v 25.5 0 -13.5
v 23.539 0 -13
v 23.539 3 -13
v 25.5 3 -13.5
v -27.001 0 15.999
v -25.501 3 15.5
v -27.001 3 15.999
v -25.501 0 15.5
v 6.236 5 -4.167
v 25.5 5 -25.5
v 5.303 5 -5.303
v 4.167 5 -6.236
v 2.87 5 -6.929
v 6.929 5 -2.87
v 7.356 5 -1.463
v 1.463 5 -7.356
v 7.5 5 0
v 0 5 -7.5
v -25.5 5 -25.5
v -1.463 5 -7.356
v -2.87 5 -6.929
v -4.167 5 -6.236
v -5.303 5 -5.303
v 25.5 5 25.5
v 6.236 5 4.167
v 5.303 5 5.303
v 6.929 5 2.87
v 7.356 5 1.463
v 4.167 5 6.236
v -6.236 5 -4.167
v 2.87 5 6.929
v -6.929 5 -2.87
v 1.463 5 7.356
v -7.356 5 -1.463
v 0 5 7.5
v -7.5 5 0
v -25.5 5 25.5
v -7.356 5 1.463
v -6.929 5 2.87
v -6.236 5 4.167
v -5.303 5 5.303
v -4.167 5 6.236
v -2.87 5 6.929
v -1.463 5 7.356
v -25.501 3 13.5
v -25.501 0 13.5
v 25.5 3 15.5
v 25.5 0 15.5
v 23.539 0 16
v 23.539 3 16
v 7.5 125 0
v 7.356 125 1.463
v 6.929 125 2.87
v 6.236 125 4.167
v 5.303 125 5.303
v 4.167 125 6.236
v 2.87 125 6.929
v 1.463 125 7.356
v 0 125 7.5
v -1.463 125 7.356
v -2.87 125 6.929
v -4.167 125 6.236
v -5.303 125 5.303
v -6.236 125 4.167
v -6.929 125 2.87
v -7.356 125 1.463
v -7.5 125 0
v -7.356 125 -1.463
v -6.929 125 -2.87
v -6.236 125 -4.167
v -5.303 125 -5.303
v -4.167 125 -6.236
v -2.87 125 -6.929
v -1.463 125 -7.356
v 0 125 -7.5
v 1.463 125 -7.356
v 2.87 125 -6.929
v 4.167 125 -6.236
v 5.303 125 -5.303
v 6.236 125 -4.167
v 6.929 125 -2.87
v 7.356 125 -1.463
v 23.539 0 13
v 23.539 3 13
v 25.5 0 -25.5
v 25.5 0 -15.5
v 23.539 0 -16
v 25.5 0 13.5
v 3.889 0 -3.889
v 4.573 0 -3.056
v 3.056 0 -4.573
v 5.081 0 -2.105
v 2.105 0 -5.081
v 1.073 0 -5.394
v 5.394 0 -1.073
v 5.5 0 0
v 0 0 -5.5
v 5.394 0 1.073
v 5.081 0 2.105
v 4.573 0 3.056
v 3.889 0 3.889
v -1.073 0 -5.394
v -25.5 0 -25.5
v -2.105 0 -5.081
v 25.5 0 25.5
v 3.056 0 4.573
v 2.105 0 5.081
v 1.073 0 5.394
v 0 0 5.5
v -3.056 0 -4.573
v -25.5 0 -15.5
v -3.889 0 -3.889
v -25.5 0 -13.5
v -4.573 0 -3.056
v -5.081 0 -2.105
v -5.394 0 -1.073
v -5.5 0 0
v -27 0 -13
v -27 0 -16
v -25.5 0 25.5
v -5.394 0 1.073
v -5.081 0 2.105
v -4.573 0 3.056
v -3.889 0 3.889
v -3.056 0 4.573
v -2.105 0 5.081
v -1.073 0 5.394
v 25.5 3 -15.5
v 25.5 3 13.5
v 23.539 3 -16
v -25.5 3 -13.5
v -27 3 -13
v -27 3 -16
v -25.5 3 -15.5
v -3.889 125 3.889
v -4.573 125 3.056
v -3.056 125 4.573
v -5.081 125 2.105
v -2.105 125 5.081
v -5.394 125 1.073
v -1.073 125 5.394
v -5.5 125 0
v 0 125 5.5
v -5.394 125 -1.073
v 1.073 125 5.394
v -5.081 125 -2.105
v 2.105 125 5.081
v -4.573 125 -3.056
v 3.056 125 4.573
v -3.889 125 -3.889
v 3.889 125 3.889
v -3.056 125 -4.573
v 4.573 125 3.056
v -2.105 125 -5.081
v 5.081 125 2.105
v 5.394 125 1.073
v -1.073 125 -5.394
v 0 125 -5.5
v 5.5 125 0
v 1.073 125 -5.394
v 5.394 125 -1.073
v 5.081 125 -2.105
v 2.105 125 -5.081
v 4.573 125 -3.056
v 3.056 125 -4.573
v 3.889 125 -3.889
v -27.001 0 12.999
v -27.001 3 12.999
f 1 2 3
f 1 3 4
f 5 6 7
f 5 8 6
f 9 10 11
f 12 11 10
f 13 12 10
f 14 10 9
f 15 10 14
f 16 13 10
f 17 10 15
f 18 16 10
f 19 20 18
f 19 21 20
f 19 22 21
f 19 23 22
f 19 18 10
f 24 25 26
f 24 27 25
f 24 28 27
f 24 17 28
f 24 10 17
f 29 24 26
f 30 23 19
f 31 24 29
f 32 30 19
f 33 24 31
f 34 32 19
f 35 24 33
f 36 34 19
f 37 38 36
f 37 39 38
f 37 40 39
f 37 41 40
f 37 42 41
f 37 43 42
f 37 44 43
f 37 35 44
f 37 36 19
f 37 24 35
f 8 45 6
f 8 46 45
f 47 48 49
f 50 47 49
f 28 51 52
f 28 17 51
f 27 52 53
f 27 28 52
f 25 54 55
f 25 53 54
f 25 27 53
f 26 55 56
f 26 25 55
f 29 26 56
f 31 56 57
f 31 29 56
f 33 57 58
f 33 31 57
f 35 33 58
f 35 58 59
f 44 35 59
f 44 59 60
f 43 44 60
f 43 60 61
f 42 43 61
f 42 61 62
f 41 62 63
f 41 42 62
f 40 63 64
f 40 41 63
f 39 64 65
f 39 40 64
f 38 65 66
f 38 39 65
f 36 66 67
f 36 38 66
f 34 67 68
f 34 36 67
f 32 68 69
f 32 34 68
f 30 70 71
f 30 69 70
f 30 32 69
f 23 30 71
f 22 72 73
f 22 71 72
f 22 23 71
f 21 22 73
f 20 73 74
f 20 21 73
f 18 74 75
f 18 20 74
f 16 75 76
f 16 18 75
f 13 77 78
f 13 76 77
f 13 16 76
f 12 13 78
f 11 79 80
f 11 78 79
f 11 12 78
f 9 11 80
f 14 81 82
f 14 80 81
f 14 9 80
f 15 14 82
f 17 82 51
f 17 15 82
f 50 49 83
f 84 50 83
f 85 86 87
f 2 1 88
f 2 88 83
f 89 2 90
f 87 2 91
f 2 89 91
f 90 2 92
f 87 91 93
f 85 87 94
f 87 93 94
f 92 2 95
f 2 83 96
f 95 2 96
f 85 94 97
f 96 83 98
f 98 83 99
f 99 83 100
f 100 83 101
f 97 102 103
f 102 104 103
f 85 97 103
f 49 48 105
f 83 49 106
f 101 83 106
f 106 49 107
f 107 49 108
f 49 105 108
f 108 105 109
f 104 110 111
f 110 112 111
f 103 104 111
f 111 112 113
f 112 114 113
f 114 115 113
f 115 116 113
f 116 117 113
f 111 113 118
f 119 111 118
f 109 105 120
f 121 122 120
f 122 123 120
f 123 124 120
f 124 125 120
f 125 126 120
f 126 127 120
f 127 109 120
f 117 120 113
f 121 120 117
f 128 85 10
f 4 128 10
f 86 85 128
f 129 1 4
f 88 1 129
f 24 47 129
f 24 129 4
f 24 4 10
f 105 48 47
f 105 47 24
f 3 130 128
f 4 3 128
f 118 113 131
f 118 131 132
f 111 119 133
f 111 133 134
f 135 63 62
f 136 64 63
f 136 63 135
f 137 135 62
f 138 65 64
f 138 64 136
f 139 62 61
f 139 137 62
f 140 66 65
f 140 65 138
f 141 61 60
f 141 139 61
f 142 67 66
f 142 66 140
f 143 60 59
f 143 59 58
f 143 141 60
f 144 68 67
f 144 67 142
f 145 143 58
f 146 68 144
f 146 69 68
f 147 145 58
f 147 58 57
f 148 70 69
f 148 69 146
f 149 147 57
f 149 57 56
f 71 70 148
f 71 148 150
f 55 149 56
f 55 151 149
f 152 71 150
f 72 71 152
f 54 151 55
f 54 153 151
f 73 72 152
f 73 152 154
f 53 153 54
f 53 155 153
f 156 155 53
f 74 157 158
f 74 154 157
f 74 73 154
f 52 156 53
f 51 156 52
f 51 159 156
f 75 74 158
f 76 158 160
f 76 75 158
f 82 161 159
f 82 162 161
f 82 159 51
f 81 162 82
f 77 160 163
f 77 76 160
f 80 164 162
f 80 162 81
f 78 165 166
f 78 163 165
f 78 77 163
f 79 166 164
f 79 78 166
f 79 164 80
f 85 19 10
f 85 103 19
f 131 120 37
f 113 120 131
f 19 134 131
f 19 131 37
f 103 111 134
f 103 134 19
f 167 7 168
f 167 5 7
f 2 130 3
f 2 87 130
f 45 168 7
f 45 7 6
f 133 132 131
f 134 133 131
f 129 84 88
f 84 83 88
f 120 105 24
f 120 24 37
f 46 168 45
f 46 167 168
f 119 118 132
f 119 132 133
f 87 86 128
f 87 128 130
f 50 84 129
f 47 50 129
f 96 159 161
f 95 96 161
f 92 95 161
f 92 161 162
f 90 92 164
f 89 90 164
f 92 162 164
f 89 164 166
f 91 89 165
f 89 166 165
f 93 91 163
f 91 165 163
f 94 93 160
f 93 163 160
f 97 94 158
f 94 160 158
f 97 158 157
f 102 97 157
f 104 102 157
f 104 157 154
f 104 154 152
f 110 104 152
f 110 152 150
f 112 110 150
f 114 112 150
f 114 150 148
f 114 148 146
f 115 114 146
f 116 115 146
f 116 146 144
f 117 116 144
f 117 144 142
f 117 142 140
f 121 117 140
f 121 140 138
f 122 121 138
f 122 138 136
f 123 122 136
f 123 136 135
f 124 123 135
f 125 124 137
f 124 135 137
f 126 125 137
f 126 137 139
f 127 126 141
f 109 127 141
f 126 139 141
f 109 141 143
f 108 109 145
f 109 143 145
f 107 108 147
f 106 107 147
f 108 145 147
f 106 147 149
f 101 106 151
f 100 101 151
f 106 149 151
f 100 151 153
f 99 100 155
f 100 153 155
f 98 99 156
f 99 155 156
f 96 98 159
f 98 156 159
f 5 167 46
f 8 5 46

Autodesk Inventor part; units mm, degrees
ref_plane "YZ Plane" through (0, 0, 0) normal (1, 0, 0) x (0, 1, 0)
ref_plane "XZ Plane" through (0, 0, 0) normal (0, 1, 0) x (-1, 0, 0)
ref_plane "XY Plane" through (0, 0, 0) normal (0, 0, 1) x (1, 0, 0)
sketch "Sketch1" plane through (0, 0, 0) normal (0, 1, 0) x (-1, 0, 0)
  line L0 (25.5, -25.5) -> (-25.5, -25.5)
  line L1 (-25.5, -25.5) -> (-25.5, 25.5)
  line L2 (-25.5, 25.5) -> (25.5, 25.5)
  line L3 (25.5, 25.5) -> (25.5, -25.5)
  line L4 (25.5, -25.5) -> (-25.5, 25.5) construction
  line L5 (-25.5, -25.5) -> (25.5, 25.5) construction
  point P0 (0, 0)
  dimension "d0" = 51
  dimension "d1" = 51
extrude "Extrusion1" add sketch "Sketch1" along normal blind 5
sketch "Sketch2" plane through (0, 5, 0) normal (0, 1, 0) x (1, 0, 0)
  circle A0 centre (0, 0) radius 7.5
  dimension "d4" = 15
extrude "Extrusion2" add sketch "Sketch2" along normal blind 120
sketch "Sketch3" plane through (0, 125, 0) normal (0, 1, 0) x (1, 0, 0)
  circle A0 centre (0, 0) radius 5.5
  dimension "d7" = 11
extrude "Extrusion3" cut sketch "Sketch3" against normal blind 125
sketch "Sketch4" plane through (0, 0, 0) normal (0, -1, 0) x (1, 0, 0)
  line L0 (-25.5, -25.5) -> (-25.5, 25.5)
  line L1 (-25.5, 15.5) -> (-27.000887, 15.99867)
  line L2 (-27.000887, 15.99867) -> (-27.000887, 12.99867)
  line L3 (-27.000887, 12.99867) -> (-25.500887, 13.5)
  line L4 (-25.500887, 13.5) -> (-25.500887, 16.5)
  line L5 (-25.500887, 16.5) -> (-25.500887, 12.844087)
  line L6 (-25.5, -15.5) -> (-27, -16)
  line L7 (-27, -16) -> (-27, -13)
  line L8 (-27, -13) -> (-25.5, -13.5)
  line L9 (-25.5, -15.5) -> (-25.5, -13.5)
  line L10 (-25.5, -25.5) -> (-25.5, 25.5)
  point P0 (0, 0)
  point P1 (-25.500887, 15)
  point P2 (-25.500887, 15.500295)
  dimension "d10" = 3
  dimension "d11" = 3
  dimension "d12" = 2
  dimension "d13" = 1.5
  dimension "d14" = 10
  dimension "d15" = 3
  dimension "d16" = 2
  dimension "d17" = 1.5
  dimension "d18" = 10
  dimension "d19" = 1.5
sketch "Sketch4 outline for Extrusion4" plane through (0, 0, 0) normal (0, -1, 0) x (1, 0, 0)
  line L0 (-27.000887, 15.99867) -> (-27.000887, 12.99867)
  line L1 (-25.500887, 15.500295) -> (-27.000887, 15.99867)
  line L2 (-25.500887, 13.5) -> (-25.500887, 15.500295)
  line L3 (-27.000887, 12.99867) -> (-25.500887, 13.5)
  line L4 (-27, -13) -> (-27, -16)
  line L5 (-25.5, -13.5) -> (-27, -13)
  line L6 (-25.5, -15.5) -> (-25.5, -13.5)
  line L7 (-27, -16) -> (-25.5, -15.5)
extrude "Extrusion4" add sketch "Sketch4 outline for Extrusion4" against normal blind 3
sketch "Sketch5" plane through (0, 0, 0) normal (0, -1, 0) x (1, 0, 0)
  line L0 (25.5, 25.5) -> (25.5, -25.5)
  line L1 (25.5, -15.5) -> (23.539279, -16)
  line L2 (23.539279, -16) -> (23.539279, -13)
  line L3 (23.539279, -13) -> (25.5, -13.5)
  line L4 (25.5, -15.5) -> (25.5, -13.5)
  line L5 (25.5, 15.5) -> (23.538534, 16)
  line L6 (23.538534, 16) -> (23.538534, 13)
  line L7 (23.538534, 13) -> (25.5, 13.5)
  line L8 (25.5, 15.5) -> (25.5, 13.5)
  point P0 (0, 0)
  dimension "d22" = 3
  dimension "d23" = 2
  dimension "d24" = 10
  dimension "d25" = 2
  dimension "d26" = 3
  dimension "d27" = 10
extrude "Extrusion5" cut sketch "Sketch5" against normal blind 3
properties part number "desoldering_wick_stand"
